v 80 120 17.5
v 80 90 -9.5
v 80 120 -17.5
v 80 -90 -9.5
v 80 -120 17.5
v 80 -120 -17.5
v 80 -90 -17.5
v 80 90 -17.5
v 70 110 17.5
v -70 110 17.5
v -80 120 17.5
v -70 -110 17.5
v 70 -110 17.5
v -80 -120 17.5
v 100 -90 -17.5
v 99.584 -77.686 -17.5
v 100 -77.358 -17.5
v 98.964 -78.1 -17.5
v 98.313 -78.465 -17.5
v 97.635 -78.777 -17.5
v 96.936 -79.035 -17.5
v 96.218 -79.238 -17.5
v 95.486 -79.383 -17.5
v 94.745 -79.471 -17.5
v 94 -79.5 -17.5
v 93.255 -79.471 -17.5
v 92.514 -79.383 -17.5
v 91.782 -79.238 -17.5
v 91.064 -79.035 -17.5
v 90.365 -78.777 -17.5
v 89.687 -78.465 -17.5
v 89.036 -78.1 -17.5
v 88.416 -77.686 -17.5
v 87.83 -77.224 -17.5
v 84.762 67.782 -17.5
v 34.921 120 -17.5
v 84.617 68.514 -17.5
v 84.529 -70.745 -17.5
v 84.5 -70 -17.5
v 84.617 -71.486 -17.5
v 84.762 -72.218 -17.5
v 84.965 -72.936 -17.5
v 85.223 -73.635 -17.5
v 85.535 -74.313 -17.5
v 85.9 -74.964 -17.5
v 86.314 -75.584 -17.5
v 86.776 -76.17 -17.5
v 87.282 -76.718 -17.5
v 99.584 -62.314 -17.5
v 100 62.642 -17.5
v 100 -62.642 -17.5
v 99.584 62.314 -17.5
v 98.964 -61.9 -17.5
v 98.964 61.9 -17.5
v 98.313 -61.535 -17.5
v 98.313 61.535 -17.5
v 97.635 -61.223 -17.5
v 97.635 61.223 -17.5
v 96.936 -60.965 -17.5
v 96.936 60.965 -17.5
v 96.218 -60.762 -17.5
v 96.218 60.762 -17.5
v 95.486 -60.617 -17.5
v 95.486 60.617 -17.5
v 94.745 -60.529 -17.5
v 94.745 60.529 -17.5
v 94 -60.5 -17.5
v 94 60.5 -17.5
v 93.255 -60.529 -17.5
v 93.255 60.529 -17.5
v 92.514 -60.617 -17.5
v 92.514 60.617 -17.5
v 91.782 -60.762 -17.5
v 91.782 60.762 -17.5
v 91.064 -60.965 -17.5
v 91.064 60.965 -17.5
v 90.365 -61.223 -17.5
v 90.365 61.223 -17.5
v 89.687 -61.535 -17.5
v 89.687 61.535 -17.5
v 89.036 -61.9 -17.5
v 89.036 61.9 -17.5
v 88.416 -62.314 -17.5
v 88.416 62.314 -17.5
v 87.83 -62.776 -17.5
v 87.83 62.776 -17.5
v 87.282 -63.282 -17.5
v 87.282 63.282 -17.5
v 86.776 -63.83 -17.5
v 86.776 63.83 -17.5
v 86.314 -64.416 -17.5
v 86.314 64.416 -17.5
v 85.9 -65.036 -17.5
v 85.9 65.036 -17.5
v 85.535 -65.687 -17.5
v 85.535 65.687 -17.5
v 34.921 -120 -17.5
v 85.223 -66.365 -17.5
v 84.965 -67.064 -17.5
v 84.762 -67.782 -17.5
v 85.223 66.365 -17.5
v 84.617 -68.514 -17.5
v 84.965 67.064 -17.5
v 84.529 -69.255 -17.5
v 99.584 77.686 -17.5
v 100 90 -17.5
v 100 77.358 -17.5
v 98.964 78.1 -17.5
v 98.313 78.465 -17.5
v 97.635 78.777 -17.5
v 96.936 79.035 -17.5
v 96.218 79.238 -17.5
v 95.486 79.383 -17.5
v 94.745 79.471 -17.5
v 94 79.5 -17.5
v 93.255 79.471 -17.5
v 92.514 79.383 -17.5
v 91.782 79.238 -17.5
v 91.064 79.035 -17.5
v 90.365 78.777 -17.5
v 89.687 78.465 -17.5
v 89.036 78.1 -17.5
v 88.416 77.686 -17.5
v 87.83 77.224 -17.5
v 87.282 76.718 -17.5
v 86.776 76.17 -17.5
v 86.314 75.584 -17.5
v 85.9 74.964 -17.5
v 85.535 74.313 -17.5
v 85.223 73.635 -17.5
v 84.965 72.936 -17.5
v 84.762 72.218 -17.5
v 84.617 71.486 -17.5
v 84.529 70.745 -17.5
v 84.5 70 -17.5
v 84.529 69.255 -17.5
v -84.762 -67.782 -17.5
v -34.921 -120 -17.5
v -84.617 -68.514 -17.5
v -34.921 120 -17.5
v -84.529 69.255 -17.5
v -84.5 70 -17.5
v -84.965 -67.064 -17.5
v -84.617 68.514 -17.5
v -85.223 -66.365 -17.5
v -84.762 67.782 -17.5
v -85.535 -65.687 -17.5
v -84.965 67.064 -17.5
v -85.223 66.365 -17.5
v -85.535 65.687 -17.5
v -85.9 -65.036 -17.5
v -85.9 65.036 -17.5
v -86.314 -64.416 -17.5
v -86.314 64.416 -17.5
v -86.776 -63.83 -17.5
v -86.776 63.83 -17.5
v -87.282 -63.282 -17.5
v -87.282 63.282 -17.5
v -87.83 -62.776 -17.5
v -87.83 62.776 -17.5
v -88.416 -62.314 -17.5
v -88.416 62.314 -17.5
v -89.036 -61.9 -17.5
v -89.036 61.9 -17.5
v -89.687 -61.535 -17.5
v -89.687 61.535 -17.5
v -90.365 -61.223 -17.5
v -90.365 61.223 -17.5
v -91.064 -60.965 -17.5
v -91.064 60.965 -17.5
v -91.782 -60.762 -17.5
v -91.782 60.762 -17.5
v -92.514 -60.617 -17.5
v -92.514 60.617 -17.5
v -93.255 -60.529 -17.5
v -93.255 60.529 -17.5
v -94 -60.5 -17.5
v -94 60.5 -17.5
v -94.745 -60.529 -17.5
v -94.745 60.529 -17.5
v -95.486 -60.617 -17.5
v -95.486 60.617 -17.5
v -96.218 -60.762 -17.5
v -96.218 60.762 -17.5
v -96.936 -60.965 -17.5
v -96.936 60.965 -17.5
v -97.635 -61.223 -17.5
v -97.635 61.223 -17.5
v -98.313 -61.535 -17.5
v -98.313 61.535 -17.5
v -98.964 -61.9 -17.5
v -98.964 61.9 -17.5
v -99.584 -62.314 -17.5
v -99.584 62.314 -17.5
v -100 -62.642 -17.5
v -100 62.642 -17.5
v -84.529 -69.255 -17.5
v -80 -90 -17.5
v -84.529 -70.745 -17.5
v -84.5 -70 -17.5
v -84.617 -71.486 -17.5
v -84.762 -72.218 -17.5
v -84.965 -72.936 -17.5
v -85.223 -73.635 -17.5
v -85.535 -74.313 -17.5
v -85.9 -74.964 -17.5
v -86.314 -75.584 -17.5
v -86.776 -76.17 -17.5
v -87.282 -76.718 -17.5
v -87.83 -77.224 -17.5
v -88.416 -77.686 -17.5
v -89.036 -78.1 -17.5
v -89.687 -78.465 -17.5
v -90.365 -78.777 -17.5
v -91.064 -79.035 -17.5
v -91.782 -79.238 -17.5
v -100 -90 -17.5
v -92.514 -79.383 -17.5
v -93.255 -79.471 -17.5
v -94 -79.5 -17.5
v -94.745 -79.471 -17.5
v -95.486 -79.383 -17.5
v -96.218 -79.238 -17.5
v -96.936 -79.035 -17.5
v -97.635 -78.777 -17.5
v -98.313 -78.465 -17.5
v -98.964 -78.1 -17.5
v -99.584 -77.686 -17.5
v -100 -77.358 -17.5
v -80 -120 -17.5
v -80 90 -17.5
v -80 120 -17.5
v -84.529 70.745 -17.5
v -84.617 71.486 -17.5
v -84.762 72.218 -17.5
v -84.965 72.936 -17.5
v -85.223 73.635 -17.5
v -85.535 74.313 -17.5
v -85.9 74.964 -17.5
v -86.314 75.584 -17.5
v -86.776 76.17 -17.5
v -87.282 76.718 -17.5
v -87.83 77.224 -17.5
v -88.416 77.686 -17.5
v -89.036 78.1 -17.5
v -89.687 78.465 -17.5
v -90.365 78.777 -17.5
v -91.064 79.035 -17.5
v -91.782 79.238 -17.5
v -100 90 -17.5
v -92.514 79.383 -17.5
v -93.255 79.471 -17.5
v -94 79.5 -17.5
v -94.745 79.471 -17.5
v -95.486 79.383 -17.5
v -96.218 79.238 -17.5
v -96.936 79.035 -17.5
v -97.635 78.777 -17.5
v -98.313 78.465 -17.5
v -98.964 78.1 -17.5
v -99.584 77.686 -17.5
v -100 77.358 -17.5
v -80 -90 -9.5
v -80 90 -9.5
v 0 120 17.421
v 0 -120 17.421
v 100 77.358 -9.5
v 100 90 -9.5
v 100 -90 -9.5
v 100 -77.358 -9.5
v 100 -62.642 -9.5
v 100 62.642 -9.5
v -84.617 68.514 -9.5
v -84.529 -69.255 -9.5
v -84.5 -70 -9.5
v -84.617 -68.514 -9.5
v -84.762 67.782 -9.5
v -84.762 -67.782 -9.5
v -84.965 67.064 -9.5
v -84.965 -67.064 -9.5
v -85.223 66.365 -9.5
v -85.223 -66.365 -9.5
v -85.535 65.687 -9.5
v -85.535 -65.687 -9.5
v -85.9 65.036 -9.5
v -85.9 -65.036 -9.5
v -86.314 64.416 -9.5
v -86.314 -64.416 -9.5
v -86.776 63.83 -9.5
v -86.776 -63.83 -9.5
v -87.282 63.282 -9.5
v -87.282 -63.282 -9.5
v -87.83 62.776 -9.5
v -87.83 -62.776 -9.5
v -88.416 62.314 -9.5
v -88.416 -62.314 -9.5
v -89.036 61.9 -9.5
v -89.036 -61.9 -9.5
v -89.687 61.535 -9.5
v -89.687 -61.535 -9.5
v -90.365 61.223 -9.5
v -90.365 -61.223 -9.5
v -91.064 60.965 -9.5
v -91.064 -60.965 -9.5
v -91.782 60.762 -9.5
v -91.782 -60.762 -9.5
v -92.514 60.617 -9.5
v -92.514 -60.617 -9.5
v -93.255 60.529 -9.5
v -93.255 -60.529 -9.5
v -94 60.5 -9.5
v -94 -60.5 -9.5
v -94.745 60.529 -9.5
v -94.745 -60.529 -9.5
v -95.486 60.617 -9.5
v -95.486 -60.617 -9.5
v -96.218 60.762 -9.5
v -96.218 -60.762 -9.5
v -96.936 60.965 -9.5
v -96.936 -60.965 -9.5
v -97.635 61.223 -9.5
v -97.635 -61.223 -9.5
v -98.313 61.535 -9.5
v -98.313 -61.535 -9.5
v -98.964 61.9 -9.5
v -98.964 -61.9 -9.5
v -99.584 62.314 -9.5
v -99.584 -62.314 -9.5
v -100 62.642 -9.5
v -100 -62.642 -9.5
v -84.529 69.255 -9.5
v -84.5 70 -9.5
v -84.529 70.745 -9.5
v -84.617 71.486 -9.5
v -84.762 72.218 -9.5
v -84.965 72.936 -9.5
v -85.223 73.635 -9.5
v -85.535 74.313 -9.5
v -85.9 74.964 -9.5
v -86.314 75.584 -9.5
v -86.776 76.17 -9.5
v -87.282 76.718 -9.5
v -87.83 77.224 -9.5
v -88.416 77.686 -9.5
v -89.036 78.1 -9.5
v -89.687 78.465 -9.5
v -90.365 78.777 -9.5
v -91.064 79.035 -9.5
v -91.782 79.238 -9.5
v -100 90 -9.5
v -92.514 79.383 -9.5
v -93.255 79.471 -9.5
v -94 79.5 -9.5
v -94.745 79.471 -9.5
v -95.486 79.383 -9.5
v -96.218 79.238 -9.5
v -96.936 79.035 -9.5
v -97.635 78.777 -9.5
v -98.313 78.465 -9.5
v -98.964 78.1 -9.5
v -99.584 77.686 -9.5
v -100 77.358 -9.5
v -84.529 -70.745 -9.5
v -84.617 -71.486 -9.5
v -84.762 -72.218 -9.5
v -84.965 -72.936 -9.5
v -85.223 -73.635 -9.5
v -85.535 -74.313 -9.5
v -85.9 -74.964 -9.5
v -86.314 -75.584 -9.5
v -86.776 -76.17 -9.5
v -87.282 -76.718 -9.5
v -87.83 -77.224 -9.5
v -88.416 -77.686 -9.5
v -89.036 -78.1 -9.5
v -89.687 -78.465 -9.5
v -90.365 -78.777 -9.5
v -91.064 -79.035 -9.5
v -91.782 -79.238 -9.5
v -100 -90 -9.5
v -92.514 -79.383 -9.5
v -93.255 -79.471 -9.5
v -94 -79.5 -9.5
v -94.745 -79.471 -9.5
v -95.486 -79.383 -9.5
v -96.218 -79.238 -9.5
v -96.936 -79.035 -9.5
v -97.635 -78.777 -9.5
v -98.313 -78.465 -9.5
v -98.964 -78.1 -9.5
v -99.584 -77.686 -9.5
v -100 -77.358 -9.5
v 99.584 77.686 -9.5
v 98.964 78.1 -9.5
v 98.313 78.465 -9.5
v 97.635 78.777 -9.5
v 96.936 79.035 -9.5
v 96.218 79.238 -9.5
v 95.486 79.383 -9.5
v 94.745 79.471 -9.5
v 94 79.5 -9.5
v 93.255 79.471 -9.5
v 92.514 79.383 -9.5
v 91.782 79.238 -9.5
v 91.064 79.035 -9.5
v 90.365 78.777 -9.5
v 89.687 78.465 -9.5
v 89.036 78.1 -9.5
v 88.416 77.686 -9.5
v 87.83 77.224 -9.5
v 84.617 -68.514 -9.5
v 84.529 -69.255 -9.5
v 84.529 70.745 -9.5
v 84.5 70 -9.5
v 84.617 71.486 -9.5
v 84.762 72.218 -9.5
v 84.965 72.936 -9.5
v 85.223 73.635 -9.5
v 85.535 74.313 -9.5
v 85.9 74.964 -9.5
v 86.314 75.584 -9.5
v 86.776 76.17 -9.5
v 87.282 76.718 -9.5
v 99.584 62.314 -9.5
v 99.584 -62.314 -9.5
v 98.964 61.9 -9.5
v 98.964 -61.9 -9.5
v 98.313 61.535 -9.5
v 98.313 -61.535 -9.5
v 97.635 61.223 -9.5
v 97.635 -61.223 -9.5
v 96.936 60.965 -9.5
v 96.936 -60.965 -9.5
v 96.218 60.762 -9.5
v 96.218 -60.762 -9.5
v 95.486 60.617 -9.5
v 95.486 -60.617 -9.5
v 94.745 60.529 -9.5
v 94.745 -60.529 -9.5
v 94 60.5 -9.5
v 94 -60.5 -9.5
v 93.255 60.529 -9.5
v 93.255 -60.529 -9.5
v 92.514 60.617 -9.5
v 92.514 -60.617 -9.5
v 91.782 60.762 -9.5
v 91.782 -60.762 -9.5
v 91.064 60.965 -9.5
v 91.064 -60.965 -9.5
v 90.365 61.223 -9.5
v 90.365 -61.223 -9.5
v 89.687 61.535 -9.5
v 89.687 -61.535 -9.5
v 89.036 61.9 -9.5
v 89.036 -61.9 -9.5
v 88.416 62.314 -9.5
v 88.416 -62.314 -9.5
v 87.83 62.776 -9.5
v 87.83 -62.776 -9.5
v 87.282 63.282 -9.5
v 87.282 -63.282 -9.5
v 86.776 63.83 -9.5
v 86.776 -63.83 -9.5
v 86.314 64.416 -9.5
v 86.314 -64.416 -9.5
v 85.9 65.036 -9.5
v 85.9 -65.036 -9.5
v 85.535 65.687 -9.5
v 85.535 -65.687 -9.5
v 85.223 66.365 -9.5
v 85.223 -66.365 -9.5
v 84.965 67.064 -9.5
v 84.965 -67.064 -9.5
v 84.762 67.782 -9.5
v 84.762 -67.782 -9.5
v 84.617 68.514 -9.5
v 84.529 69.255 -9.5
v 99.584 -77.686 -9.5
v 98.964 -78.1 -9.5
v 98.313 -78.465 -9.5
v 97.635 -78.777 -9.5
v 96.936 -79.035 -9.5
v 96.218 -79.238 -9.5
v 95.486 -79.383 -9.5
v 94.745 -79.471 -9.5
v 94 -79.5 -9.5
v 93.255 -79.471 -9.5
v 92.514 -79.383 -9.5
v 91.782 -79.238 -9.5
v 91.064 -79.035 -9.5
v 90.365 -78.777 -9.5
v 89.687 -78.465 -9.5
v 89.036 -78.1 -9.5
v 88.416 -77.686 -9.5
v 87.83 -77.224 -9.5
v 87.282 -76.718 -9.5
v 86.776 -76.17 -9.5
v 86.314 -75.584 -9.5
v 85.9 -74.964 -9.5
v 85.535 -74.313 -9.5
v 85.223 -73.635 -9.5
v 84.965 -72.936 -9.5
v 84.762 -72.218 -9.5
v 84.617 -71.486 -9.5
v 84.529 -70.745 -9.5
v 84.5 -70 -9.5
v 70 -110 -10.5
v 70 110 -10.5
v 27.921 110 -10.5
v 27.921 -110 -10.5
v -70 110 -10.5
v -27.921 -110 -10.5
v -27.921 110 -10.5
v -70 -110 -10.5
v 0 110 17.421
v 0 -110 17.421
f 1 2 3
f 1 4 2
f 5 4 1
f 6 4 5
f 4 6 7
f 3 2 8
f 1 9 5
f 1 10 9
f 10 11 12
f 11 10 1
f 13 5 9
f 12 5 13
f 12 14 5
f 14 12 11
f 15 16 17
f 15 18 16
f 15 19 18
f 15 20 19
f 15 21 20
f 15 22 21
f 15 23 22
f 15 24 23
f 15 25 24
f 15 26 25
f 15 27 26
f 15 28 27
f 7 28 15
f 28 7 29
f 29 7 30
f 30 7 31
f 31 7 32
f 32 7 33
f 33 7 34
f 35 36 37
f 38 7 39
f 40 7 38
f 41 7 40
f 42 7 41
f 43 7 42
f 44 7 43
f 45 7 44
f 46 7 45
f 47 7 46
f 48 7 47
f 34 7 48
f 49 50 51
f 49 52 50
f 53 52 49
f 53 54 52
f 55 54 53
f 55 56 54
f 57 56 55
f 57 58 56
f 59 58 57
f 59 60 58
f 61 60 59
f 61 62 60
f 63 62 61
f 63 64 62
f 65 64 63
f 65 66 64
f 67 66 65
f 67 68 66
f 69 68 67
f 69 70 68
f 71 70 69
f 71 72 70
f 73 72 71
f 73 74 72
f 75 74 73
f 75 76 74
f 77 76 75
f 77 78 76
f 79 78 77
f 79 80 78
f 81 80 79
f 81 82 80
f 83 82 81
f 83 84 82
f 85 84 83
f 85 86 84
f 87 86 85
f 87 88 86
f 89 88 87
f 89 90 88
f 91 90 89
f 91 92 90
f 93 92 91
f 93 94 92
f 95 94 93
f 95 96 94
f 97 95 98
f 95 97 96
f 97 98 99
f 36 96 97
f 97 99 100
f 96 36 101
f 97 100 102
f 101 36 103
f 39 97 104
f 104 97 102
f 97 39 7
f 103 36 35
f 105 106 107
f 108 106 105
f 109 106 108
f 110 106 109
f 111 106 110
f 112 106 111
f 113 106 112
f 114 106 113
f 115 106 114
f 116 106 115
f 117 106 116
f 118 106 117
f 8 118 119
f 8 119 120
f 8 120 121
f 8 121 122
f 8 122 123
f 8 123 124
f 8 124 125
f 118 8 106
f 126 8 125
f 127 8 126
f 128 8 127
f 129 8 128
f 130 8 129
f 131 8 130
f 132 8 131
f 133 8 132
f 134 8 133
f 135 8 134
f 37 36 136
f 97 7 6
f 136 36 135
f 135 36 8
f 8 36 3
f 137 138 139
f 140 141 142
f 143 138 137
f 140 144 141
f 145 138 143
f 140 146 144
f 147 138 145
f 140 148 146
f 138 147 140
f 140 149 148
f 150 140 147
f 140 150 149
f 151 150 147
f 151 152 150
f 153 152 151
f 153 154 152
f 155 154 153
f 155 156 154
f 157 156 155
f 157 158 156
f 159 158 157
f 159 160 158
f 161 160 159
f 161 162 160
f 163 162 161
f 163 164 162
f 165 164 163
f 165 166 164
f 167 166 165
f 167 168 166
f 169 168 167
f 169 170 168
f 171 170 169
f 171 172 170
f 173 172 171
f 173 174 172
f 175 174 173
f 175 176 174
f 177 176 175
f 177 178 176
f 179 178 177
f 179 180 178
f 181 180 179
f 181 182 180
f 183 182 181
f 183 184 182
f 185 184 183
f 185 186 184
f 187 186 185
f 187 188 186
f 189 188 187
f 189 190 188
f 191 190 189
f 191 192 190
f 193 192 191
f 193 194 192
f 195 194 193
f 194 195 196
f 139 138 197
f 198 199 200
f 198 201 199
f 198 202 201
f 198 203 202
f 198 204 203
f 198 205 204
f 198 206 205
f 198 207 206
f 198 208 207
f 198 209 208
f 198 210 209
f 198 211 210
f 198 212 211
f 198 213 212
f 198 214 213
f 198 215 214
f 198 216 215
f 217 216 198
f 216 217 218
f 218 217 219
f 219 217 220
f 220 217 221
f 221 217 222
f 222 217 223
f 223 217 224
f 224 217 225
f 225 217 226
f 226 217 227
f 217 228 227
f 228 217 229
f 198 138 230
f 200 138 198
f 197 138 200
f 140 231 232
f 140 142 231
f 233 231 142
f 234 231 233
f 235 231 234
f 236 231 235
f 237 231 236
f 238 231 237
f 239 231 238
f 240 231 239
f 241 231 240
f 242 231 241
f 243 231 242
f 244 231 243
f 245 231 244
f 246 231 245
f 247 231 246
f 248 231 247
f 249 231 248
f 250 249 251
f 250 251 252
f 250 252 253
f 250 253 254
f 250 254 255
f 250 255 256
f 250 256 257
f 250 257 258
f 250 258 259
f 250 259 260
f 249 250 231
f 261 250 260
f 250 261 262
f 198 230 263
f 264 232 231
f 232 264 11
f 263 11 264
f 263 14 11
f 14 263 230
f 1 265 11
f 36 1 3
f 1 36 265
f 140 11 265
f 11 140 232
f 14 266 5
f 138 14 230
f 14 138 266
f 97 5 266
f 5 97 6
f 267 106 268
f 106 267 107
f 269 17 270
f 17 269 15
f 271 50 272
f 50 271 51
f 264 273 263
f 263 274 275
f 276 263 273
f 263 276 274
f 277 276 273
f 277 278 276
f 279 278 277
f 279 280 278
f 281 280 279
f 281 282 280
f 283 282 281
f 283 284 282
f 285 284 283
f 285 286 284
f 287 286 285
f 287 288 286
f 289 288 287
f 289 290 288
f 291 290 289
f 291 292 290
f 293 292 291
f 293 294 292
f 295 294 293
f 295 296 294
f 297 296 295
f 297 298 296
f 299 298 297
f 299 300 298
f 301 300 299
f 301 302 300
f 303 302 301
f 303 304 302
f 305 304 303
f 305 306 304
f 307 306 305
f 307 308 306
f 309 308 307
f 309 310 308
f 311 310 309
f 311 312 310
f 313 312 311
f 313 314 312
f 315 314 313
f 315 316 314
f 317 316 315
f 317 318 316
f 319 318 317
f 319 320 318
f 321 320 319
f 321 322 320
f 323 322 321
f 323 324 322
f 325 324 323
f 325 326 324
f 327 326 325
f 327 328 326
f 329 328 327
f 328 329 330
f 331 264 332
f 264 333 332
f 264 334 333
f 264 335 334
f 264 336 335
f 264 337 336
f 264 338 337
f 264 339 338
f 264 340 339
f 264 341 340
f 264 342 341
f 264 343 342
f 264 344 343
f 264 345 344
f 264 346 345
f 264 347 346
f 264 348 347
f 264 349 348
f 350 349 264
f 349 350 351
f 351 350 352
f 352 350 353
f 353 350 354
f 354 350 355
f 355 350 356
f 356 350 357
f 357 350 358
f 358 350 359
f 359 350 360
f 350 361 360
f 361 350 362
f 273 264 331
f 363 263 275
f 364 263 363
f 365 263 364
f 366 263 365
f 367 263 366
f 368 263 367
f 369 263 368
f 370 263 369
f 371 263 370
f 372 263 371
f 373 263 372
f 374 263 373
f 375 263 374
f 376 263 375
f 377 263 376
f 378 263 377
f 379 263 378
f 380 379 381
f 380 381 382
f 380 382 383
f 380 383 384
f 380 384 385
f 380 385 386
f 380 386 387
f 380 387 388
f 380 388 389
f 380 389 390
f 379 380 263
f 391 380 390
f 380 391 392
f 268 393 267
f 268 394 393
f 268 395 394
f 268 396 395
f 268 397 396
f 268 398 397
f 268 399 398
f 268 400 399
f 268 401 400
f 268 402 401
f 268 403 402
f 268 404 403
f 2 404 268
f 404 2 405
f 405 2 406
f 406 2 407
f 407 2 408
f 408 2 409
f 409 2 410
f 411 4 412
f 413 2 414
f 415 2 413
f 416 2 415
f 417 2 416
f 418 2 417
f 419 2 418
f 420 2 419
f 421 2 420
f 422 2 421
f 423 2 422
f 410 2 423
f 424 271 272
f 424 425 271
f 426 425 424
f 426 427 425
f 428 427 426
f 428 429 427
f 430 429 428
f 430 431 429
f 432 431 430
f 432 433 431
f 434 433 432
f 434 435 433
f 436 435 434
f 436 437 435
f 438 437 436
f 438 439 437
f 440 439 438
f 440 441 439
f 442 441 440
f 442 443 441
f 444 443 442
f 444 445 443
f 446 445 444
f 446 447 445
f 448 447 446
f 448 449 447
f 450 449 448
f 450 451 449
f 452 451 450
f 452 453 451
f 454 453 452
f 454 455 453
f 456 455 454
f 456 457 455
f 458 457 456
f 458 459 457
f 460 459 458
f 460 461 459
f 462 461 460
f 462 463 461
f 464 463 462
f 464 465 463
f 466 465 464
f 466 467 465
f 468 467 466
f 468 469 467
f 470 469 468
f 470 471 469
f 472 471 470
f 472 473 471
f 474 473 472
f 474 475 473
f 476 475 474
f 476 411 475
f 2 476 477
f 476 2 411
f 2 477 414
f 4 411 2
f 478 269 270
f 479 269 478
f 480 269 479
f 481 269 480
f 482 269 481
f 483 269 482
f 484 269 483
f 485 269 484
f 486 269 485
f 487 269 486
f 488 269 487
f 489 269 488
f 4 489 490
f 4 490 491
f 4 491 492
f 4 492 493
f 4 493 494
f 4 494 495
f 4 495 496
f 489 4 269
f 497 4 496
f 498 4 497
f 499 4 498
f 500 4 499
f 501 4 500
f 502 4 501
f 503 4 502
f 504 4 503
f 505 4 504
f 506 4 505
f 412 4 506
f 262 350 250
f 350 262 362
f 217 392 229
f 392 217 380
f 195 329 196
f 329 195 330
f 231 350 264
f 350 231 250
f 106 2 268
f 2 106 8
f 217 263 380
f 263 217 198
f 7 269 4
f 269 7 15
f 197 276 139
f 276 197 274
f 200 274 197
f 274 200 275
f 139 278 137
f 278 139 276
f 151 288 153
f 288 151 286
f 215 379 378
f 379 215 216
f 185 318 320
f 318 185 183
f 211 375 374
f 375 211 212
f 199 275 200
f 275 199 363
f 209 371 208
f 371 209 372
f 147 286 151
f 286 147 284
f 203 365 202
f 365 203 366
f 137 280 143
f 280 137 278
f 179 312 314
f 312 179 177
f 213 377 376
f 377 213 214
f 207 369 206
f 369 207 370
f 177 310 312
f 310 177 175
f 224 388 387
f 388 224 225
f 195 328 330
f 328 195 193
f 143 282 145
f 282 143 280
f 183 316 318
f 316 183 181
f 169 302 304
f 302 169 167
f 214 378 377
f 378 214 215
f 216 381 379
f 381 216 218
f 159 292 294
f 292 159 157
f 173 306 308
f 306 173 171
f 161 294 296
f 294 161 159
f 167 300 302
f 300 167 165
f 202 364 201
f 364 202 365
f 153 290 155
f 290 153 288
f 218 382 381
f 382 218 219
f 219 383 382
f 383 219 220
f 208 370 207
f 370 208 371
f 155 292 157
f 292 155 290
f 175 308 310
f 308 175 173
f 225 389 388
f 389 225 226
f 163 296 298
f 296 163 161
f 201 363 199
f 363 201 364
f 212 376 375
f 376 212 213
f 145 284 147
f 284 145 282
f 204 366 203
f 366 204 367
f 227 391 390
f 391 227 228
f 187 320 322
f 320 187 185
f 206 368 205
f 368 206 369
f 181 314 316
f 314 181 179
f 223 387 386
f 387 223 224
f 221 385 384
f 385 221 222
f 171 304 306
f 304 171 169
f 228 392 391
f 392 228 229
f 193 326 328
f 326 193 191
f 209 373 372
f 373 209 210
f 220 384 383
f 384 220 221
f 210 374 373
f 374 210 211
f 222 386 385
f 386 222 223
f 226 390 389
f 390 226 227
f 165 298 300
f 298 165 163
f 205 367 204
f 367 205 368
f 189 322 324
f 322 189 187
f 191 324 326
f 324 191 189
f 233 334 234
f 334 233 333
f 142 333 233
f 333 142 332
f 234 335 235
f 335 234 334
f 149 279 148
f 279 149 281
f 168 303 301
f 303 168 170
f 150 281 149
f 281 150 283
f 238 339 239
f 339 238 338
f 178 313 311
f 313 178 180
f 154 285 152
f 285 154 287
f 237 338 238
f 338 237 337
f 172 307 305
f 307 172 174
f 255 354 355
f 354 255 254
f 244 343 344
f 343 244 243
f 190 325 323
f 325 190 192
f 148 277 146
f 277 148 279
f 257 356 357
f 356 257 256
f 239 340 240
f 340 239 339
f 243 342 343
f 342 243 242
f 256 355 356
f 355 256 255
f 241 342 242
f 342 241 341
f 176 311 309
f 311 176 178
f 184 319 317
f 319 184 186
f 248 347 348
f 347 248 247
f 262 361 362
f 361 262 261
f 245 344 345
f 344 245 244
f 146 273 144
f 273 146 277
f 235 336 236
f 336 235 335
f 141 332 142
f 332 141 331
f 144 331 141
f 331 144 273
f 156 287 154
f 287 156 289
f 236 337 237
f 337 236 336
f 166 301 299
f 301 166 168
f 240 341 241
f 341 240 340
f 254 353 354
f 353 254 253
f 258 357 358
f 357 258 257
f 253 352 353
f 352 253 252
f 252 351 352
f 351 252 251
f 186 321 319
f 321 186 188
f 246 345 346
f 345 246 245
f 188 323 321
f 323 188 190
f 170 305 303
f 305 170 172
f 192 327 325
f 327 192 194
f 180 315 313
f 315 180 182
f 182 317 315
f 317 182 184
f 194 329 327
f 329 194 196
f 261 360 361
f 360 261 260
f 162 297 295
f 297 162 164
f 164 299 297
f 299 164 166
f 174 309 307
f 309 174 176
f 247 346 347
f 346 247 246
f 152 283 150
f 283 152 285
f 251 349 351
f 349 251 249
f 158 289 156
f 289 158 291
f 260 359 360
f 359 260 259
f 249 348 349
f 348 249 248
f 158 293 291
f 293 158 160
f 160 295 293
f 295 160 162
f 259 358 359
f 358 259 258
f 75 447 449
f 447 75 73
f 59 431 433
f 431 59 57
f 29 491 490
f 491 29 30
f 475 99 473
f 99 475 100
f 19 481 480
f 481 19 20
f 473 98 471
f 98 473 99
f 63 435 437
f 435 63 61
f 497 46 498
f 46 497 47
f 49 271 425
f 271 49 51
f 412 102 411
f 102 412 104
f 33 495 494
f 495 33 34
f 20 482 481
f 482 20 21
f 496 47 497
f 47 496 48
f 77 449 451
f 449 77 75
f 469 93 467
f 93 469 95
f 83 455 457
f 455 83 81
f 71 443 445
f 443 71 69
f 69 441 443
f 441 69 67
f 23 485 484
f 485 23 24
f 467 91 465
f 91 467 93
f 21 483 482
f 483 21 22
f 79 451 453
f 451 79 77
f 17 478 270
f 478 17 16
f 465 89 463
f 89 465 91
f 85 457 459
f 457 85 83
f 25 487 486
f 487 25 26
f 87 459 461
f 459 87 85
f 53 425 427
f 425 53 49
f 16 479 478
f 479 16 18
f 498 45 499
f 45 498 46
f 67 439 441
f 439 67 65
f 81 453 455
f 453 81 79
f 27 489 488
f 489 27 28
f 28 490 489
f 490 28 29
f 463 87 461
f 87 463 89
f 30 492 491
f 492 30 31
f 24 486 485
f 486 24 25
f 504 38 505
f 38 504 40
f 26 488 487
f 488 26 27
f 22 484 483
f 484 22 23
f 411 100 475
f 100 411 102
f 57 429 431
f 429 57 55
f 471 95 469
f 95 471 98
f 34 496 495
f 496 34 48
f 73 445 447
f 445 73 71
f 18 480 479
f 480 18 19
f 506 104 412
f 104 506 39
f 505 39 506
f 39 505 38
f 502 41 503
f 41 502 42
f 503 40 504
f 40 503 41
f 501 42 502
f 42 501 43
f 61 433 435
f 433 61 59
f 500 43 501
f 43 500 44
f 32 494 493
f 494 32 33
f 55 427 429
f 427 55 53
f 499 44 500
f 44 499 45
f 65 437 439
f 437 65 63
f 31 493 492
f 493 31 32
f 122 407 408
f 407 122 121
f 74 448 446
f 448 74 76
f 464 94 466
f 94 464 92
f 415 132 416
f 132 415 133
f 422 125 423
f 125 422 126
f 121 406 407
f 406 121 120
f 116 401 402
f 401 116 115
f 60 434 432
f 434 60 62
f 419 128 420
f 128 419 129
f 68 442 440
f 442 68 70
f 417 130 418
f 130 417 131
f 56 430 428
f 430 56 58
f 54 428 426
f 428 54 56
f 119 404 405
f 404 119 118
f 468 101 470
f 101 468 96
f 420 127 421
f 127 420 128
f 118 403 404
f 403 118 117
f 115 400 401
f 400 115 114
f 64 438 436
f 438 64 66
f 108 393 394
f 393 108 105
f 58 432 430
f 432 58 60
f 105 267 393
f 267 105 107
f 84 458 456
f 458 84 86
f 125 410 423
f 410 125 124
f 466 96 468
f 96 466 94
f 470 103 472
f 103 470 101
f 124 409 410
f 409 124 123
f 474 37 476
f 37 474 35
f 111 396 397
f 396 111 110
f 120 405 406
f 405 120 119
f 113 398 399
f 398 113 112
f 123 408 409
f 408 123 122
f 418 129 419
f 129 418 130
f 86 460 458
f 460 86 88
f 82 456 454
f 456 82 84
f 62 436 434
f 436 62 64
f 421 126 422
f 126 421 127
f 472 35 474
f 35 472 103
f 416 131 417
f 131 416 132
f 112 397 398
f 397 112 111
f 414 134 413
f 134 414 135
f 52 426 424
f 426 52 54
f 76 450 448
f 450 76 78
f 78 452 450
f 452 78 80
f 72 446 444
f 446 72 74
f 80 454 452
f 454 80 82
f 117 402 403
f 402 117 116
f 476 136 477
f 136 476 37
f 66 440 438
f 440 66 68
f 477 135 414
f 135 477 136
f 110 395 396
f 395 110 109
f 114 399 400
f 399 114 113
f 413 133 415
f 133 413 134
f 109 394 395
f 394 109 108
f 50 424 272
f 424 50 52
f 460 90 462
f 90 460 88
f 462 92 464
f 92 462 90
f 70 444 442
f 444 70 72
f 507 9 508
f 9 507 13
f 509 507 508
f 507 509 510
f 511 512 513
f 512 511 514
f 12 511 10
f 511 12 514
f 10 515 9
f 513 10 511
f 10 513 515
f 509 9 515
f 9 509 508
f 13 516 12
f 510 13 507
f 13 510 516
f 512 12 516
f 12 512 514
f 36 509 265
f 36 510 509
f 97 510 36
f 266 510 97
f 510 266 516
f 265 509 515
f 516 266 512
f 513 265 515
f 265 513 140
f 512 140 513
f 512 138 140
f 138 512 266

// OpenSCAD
// ===================================================================================
// UNIVAC IX Smart Farm Mechanical Layer: Vintage Telephony Enclosure Cradle
// Engineered for heavy vintage field sets mounted to multi-ply LVL or rough studs
// ===================================================================================

$fn = 80;

// Vintage UNIVAC Telephone Housing dimension variables
phone_w = 140;         // Standard width of heavy cast-iron phone base mount footprint
phone_l = 220;         // Vertical height footprint of phone chassis backplate
wall_t = 10;           // Thick 10mm structural wall profile to sustain hand-crank torque
cradle_depth = 35;     // Protective retention flange depth for phone box
stud_width = 50.8;     // 2-inch rough-sawn dimensional timber indexing reference

module univac_phone_cradle() {
    difference() {
        union() {
            // 1. Primary Reinforced Cradle Structural Block
            cube([phone_w + (wall_t * 2), phone_l + (wall_t * 2), cradle_depth], center=true);
            
            // 2. Dual Side Flanged Heavy-Duty Mounting Wings
            translate([0, 0, -(cradle_depth/2) + 4])
                cube([phone_w + (wall_t * 6), phone_l - 40, 8], center=true);
        }
        
        // --------------------------------===========================================
        // A. RETENTION COMPARTMENT: Main Cavity for the Telephone Housing
        // --------------------------------===========================================
        translate([0, 0, wall_t/2 + 2])
            cube([phone_w, phone_l, cradle_depth], center=true);
            
        // --------------------------------===========================================
        // B. WIRING PASS-THROUGH: 12-Pin Twist Lock Interconnect Opening
        // --------------------------------===========================================
        // Center cutout allows the 12-pin twist-lock cabling fabric to pass underneath
        translate([0, -(phone_l/2) + 30, -cradle_depth]) 
            cylinder(h=50, r=22, center=true);
            
        // --------------------------------===========================================
        // C. STRUCTURAL ANCHORS: 4x Heavy-Duty Timber Ledger Screw Counterbores
        // --------------------------------===========================================
        // Located on the wide exterior mounting wings for easy driver drill clearance
        for(x = [-(phone_w/2) - 24, (phone_w/2) + 24]) {
            for(y = [-(phone_l/2) + 40, (phone_l/2) - 40]) {
                // Shank clearance channel for 5/16" or 8mm structural ledger screws
                translate([x, y, -cradle_depth]) cylinder(h=50, r=4.5, center=true);
                // Wide counterbore pocket to sink the bolt head flush with the wing surface
                translate([x, y, -(cradle_depth/2) + 4]) cylinder(h=10, r=9.5, center=true);
            }
        }
        
        // --------------------------------===========================================
        // D. TIMBER ALIGNMENT: Backside Rough-Sawn Stud Self-Centering Channel
        // --------------------------------===========================================
        // 120-Degree V-Notch carved into the back face allowing a lock on 2" studs/poles
        translate([0, 0, -(cradle_depth/2) - 1])
            rotate([0, 45, 0])
                cube([stud_width, phone_l + 30, stud_width], center=true);
    }
}

// Render structural telephone housing cradle unit
color("DarkOliveGreen") univac_phone_cradle();
